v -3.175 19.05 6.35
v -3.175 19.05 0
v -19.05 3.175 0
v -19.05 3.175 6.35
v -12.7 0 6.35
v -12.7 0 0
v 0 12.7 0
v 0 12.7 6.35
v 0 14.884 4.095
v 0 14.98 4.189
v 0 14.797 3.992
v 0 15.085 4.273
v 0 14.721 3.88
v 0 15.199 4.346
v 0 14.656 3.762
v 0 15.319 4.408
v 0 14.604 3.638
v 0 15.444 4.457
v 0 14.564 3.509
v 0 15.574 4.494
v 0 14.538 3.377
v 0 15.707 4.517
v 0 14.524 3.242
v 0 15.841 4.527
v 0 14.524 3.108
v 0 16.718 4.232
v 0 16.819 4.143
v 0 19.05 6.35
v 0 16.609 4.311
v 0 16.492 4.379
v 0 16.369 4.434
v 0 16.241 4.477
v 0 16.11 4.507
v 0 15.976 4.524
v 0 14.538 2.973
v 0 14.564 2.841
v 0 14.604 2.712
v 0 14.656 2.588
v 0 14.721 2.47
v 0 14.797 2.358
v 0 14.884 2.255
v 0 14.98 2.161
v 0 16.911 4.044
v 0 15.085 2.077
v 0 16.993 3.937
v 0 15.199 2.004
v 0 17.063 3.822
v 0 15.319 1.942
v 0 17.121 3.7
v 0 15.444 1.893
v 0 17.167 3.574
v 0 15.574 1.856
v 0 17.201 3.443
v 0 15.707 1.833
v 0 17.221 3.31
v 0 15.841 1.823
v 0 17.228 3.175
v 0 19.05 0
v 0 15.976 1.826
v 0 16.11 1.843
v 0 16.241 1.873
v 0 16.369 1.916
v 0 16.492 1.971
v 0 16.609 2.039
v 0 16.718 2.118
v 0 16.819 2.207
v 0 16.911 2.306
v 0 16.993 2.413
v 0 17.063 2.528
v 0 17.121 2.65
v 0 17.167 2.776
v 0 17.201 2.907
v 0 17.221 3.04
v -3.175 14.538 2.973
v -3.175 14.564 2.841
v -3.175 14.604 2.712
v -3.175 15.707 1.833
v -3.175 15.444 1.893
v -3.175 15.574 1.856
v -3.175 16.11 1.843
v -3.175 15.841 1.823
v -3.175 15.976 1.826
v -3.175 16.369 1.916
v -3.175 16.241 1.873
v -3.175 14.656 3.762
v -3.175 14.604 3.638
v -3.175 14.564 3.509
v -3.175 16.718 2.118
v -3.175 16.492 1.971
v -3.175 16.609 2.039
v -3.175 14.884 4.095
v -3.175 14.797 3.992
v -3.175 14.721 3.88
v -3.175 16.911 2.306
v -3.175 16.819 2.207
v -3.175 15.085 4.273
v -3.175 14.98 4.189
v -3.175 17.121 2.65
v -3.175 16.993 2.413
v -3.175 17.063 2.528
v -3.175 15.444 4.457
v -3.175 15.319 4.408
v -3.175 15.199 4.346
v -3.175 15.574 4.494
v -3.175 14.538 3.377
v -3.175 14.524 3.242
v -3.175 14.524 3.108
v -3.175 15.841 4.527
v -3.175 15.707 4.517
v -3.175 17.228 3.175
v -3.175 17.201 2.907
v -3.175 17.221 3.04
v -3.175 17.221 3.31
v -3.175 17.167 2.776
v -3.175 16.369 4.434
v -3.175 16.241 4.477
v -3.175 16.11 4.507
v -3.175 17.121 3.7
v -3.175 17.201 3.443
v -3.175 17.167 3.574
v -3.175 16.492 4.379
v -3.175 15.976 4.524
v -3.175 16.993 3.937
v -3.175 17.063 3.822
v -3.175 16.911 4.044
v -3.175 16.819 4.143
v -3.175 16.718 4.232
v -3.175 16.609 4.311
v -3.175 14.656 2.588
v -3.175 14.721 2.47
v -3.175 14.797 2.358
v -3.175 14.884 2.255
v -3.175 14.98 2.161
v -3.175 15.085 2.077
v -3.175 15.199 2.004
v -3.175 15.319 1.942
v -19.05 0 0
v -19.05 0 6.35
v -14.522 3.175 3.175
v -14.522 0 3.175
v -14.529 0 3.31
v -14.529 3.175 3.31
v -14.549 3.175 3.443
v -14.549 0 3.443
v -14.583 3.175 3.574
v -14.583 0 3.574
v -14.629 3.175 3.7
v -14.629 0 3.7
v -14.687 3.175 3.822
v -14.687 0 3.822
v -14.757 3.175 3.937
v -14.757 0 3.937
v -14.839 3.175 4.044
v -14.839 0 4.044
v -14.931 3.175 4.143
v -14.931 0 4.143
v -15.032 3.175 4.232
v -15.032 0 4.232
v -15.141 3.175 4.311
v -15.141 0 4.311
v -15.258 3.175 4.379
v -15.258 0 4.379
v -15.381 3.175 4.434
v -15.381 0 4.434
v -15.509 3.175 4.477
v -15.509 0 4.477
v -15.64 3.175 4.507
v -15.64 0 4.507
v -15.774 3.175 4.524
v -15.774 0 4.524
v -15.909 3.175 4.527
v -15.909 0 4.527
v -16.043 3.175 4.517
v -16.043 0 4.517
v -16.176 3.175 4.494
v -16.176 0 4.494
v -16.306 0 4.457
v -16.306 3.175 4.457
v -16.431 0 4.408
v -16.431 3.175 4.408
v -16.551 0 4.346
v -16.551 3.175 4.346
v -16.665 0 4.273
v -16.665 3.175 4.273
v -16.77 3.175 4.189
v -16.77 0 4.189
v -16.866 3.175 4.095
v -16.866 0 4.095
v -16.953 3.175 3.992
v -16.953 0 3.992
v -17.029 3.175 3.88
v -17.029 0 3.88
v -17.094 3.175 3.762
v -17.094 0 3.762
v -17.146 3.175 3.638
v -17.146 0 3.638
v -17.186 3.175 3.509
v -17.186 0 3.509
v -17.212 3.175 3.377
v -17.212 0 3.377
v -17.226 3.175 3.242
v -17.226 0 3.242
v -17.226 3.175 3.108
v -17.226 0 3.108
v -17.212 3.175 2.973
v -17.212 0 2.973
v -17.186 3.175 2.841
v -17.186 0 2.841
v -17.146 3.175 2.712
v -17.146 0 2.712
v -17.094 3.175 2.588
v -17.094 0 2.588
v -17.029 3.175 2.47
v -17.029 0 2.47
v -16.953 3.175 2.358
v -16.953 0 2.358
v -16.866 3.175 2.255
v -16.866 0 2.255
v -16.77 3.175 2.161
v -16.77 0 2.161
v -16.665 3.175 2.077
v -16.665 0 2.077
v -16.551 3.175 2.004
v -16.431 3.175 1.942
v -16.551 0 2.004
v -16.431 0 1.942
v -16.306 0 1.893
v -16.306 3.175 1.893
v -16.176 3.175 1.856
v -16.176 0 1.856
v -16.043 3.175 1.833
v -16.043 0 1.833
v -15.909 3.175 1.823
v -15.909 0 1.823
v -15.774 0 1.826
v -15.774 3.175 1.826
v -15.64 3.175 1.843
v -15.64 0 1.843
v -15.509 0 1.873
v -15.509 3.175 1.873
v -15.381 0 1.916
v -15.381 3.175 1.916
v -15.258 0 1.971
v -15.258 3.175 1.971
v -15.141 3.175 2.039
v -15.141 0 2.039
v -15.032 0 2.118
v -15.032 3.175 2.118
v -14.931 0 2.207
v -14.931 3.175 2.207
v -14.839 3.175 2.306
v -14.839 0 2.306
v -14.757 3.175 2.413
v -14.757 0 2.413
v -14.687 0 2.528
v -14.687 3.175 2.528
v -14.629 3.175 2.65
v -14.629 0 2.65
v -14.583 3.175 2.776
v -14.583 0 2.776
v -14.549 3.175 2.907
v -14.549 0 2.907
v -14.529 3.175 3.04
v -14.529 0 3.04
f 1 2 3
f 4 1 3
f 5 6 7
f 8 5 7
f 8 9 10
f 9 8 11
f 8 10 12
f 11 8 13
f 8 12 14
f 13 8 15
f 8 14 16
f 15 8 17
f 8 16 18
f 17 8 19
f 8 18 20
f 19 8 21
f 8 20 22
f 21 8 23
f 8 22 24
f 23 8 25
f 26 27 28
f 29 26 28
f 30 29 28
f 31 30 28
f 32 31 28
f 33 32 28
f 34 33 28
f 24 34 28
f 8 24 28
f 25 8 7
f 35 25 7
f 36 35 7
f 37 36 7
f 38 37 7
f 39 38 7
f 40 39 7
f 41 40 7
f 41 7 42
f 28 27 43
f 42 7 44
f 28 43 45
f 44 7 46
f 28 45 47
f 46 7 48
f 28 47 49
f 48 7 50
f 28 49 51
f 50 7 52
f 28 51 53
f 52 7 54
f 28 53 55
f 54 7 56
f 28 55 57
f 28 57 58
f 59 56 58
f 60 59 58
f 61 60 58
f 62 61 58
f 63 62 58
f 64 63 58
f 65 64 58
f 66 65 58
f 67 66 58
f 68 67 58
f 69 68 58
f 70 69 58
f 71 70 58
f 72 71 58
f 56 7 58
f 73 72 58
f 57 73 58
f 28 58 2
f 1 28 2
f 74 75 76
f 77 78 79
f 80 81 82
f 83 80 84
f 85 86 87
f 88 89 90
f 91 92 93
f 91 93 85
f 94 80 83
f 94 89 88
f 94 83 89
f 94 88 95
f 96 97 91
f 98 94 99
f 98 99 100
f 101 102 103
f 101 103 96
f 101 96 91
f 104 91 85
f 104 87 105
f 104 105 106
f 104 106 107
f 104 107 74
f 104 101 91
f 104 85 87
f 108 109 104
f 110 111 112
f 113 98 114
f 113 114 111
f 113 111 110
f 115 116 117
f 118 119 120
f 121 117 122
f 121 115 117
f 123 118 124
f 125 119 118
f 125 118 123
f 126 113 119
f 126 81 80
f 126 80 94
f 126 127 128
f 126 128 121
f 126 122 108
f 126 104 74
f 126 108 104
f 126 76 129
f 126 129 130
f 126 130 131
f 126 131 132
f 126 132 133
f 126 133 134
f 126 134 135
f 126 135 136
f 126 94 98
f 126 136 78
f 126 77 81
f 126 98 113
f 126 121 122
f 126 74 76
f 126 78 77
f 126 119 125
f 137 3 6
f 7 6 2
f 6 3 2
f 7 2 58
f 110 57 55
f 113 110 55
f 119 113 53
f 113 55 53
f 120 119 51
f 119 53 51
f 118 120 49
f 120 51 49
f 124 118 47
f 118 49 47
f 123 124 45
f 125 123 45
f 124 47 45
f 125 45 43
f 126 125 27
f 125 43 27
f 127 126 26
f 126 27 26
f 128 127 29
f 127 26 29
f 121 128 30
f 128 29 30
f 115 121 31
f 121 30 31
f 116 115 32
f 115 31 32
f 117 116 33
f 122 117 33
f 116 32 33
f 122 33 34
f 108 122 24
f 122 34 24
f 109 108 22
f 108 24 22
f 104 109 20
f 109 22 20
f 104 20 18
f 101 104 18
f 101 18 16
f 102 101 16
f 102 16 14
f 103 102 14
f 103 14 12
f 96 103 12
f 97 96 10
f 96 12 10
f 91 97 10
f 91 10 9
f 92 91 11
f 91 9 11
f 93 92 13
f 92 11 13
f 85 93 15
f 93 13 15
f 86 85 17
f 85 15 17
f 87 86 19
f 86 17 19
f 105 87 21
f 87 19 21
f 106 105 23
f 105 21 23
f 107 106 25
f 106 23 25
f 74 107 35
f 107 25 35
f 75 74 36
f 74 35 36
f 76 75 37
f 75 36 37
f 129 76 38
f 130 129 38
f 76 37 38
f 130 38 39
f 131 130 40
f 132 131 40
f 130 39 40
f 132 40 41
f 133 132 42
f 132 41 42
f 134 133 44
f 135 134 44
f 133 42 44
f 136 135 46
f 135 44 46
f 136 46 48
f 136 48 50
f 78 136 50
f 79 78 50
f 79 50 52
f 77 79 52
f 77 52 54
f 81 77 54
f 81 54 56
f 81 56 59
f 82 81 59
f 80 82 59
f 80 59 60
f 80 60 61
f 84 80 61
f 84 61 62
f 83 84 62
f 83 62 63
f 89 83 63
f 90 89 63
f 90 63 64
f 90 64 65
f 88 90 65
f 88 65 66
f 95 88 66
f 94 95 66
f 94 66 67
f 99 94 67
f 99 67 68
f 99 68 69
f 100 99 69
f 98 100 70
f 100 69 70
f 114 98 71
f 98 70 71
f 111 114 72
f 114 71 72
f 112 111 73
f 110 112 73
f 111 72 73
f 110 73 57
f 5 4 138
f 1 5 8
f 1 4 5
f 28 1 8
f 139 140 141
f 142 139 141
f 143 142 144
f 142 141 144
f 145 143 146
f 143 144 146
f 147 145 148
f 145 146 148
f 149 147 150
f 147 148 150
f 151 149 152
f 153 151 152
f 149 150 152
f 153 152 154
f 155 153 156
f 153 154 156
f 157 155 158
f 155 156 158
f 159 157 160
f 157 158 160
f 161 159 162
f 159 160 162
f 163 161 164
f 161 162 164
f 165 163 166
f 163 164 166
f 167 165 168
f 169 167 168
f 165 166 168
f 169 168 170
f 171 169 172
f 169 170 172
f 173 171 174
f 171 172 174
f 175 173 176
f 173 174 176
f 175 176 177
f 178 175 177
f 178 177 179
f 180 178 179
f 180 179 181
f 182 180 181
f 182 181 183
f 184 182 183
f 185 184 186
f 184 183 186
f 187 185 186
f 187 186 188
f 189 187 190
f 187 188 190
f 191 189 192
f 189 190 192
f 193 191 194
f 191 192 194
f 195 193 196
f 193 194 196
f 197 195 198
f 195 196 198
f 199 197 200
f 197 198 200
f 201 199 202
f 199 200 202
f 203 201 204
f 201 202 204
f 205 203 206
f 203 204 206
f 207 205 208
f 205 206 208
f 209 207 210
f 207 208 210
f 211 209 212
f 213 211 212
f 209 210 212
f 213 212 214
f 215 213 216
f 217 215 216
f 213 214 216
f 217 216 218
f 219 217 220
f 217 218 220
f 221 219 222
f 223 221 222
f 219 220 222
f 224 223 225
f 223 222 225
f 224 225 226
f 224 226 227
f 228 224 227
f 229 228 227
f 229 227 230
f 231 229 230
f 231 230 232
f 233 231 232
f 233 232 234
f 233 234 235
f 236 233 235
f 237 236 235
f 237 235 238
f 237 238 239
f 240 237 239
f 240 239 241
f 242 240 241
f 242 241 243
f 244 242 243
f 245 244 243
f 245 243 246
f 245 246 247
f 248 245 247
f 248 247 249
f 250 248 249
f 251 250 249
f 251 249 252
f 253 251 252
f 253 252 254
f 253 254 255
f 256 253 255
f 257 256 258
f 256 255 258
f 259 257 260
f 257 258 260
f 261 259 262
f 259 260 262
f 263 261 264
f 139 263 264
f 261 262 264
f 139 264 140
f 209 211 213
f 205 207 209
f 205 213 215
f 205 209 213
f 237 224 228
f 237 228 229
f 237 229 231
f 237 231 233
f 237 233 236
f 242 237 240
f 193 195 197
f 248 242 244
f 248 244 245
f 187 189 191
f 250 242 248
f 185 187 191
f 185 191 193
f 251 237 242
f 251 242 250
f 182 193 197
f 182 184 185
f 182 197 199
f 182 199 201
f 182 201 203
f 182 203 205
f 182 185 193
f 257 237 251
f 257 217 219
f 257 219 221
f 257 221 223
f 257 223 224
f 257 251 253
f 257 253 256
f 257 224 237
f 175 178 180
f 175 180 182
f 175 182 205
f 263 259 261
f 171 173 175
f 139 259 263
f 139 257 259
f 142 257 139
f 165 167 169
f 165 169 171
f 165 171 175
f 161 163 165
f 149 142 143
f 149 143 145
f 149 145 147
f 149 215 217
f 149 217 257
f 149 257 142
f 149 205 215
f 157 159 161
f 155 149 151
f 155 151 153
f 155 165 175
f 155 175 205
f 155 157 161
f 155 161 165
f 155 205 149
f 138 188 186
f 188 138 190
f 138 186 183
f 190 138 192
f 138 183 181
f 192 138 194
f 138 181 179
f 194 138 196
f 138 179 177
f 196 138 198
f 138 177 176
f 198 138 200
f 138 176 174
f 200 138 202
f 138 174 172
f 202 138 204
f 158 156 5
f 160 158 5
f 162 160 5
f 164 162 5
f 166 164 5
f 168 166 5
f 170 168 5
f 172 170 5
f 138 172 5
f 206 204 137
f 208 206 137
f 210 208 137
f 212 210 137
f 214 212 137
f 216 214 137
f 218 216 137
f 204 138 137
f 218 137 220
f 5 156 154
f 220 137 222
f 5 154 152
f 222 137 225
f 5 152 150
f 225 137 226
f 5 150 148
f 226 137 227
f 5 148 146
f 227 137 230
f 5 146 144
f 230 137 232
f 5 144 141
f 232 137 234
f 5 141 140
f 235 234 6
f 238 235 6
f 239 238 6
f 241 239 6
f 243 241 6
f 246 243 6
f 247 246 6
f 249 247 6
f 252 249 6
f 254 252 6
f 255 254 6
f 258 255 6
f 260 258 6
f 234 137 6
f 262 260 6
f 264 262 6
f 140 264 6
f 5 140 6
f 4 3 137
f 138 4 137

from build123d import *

# Parameters (mm, degrees)
F1_DEPTH = 6.35
F2_R     = 1.35255
F3_DEPTH = 3.175
F4_R     = 1.35255
F5_DEPTH = 3.175


with BuildPart() as f1:
    # F0 (on Top) → F1 (new body)
    with BuildSketch(Plane.XY):
        Polygon((-19.05, 0), (-12.7, 0), (0, 12.7), (0, 19.05), (-3.175, 19.05), (-19.05, 3.175), align=None)
    extrude(amount=F1_DEPTH)

    # F2 (on face) → F3 (cut)
    with BuildSketch(Plane.YZ):
        with Locations((15.875, 3.175)):
            Circle(F2_R)
    extrude(amount=-F3_DEPTH, mode=Mode.SUBTRACT)

    # F4 (on face) → F5 (cut)
    with BuildSketch(Plane.XZ):
        with Locations((-15.875, 3.175)):
            Circle(F4_R)
    extrude(amount=-F5_DEPTH, mode=Mode.SUBTRACT)


solid = f1.part
